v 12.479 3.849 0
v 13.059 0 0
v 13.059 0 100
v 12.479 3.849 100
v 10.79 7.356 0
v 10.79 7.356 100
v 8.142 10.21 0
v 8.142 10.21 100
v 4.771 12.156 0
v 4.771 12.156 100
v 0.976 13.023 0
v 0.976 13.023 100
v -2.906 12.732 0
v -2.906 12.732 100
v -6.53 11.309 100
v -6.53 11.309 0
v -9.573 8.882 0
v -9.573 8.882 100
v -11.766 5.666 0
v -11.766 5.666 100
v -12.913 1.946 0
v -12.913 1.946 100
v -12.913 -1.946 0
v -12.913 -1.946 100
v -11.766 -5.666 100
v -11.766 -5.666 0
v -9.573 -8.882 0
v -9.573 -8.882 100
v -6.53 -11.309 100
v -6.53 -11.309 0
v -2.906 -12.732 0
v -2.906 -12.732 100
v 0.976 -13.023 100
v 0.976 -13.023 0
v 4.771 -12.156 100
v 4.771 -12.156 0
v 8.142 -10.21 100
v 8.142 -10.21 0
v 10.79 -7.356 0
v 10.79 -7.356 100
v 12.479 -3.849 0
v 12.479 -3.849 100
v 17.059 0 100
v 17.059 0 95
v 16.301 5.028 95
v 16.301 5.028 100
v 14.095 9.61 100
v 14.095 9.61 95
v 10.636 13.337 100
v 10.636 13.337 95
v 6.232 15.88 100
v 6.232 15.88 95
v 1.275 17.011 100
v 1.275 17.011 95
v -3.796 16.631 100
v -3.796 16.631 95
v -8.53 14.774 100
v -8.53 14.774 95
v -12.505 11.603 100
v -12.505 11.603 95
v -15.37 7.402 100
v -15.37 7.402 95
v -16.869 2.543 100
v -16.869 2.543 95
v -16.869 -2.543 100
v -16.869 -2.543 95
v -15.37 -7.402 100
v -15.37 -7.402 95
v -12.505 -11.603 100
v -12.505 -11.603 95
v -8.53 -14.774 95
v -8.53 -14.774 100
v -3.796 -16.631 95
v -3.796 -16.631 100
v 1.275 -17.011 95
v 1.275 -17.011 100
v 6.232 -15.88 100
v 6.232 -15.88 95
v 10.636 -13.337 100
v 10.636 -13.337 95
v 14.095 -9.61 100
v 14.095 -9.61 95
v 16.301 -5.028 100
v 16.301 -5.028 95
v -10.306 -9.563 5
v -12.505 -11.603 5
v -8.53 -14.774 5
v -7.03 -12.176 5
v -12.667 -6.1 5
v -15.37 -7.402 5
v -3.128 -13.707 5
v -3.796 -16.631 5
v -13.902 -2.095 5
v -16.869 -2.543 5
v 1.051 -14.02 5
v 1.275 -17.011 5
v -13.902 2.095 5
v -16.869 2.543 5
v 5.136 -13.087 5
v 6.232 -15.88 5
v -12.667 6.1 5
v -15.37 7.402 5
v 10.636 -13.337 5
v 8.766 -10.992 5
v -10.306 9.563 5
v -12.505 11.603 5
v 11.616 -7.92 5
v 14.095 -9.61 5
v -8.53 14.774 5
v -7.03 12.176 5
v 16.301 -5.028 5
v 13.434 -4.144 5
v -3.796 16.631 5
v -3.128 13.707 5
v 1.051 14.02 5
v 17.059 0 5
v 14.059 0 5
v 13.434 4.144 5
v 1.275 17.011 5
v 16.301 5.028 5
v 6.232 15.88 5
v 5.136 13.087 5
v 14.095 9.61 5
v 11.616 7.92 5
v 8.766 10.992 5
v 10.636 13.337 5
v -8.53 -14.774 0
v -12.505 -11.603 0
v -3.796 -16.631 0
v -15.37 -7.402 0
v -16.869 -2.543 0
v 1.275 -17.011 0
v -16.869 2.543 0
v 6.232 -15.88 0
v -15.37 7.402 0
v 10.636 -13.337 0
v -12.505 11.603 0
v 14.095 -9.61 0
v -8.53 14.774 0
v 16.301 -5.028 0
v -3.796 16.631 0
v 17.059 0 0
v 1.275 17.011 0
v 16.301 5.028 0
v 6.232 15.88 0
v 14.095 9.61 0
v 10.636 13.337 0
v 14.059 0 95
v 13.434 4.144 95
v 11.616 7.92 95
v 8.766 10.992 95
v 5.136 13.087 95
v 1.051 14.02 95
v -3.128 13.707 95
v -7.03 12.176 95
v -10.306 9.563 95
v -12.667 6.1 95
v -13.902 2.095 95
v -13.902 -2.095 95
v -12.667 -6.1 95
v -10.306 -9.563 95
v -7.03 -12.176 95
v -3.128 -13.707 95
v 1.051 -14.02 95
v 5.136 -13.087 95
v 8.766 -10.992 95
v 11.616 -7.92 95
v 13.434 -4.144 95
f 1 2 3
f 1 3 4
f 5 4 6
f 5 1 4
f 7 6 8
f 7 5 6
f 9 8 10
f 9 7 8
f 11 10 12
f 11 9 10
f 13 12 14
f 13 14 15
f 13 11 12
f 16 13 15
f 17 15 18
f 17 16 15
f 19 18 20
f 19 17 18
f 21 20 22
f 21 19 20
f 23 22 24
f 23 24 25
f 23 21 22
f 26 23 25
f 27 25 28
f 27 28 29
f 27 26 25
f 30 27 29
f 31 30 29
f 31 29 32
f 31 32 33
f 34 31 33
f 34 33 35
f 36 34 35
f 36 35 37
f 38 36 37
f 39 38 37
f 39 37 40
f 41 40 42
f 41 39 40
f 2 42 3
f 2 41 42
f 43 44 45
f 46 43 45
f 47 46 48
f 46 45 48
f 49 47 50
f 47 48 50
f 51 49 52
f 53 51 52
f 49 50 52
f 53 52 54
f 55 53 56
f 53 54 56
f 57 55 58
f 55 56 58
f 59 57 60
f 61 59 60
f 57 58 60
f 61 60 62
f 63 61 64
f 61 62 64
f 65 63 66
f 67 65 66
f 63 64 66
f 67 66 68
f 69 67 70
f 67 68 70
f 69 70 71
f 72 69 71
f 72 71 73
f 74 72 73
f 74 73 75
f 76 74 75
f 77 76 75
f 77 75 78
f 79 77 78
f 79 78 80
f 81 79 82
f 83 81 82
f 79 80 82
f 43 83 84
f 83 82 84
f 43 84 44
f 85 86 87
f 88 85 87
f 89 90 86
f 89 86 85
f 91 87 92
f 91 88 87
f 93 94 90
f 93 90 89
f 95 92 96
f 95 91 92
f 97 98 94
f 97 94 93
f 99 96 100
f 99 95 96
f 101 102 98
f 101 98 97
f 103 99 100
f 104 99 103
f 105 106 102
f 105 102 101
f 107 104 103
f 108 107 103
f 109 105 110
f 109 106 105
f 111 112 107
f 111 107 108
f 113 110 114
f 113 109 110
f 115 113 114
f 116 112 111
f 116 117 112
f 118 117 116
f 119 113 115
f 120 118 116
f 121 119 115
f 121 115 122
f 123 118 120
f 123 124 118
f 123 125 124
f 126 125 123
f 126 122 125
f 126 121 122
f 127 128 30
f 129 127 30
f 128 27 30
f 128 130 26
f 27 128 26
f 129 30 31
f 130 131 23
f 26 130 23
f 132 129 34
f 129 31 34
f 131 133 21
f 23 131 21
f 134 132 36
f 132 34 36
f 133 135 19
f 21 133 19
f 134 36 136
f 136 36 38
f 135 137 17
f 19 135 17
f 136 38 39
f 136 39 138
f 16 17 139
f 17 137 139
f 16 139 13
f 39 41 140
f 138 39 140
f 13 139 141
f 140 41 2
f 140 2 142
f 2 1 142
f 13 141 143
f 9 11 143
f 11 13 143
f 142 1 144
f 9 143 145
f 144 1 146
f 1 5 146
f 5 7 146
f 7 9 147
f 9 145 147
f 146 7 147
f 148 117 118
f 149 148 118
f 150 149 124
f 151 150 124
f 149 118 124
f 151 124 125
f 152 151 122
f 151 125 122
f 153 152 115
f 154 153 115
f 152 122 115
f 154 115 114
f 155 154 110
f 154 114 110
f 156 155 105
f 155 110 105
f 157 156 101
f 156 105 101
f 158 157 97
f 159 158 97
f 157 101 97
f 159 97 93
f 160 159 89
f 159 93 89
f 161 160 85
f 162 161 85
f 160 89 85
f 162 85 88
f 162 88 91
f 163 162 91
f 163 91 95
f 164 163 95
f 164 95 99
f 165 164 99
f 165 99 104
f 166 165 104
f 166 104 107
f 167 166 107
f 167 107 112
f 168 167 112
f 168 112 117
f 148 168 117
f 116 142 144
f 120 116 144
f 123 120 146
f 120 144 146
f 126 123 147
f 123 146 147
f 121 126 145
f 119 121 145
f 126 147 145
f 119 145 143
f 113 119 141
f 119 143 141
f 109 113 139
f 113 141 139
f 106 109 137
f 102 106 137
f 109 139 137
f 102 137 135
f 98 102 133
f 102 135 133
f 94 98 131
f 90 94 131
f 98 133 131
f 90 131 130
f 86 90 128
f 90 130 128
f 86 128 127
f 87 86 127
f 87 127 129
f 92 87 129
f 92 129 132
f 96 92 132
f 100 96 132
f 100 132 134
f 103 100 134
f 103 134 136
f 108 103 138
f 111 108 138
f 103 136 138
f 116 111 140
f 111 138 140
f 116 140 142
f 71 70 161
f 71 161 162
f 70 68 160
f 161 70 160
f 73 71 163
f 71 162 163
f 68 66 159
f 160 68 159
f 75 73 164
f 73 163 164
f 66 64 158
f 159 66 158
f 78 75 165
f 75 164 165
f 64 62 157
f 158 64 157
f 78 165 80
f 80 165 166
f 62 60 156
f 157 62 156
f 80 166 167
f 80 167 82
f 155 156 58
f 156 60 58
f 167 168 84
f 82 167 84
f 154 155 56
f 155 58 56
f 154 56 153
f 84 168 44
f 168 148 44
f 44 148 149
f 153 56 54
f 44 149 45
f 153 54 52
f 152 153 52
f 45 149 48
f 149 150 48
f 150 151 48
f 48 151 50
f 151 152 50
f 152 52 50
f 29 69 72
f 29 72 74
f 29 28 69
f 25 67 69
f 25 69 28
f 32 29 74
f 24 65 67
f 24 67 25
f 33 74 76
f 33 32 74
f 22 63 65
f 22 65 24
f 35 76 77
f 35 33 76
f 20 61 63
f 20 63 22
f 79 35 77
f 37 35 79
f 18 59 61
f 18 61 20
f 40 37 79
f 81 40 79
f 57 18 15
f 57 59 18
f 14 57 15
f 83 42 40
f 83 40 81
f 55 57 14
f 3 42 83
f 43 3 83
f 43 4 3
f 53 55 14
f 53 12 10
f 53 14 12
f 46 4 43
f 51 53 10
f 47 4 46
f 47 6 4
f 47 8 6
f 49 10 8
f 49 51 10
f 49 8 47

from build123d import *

# Parameters (mm, degrees)
ESQUISSE1_R        = 14.059058324
ESQUISSE1_R_2      = 13.059058324
BOSS_EXTRU_3_DEPTH = 100
ESQUISSE1_6_R      = 17.059058324
ESQUISSE1_6_R_2    = 14.059058324
BOSS_EXTRU_4_DEPTH = 5
BOSS_EXTRU_5_START = -5
ESQUISSE2_R        = 17.059058324
ESQUISSE2_R_2      = 14.059058324
BOSS_EXTRU_5_DEPTH = 5


with BuildPart() as part:
    # Esquisse1 → Boss.-Extru.3 (new body)
    with BuildSketch(Plane.XY):
        Circle(ESQUISSE1_R)
        Circle(ESQUISSE1_R_2, mode=Mode.SUBTRACT)
    extrude(amount=BOSS_EXTRU_3_DEPTH)

    # Esquisse1<6> → Boss.-Extru.4 (add)
    with BuildSketch(Plane.XY):
        Circle(ESQUISSE1_6_R)
        Circle(ESQUISSE1_6_R_2, mode=Mode.SUBTRACT)
    extrude(amount=BOSS_EXTRU_4_DEPTH)

    # Esquisse2 → Boss.-Extru.5 (add)
    with BuildSketch(Plane.XY.offset(100).offset(BOSS_EXTRU_5_START)):
        Circle(ESQUISSE2_R)
        Circle(ESQUISSE2_R_2, mode=Mode.SUBTRACT)
    extrude(amount=BOSS_EXTRU_5_DEPTH)


solid = part.part
